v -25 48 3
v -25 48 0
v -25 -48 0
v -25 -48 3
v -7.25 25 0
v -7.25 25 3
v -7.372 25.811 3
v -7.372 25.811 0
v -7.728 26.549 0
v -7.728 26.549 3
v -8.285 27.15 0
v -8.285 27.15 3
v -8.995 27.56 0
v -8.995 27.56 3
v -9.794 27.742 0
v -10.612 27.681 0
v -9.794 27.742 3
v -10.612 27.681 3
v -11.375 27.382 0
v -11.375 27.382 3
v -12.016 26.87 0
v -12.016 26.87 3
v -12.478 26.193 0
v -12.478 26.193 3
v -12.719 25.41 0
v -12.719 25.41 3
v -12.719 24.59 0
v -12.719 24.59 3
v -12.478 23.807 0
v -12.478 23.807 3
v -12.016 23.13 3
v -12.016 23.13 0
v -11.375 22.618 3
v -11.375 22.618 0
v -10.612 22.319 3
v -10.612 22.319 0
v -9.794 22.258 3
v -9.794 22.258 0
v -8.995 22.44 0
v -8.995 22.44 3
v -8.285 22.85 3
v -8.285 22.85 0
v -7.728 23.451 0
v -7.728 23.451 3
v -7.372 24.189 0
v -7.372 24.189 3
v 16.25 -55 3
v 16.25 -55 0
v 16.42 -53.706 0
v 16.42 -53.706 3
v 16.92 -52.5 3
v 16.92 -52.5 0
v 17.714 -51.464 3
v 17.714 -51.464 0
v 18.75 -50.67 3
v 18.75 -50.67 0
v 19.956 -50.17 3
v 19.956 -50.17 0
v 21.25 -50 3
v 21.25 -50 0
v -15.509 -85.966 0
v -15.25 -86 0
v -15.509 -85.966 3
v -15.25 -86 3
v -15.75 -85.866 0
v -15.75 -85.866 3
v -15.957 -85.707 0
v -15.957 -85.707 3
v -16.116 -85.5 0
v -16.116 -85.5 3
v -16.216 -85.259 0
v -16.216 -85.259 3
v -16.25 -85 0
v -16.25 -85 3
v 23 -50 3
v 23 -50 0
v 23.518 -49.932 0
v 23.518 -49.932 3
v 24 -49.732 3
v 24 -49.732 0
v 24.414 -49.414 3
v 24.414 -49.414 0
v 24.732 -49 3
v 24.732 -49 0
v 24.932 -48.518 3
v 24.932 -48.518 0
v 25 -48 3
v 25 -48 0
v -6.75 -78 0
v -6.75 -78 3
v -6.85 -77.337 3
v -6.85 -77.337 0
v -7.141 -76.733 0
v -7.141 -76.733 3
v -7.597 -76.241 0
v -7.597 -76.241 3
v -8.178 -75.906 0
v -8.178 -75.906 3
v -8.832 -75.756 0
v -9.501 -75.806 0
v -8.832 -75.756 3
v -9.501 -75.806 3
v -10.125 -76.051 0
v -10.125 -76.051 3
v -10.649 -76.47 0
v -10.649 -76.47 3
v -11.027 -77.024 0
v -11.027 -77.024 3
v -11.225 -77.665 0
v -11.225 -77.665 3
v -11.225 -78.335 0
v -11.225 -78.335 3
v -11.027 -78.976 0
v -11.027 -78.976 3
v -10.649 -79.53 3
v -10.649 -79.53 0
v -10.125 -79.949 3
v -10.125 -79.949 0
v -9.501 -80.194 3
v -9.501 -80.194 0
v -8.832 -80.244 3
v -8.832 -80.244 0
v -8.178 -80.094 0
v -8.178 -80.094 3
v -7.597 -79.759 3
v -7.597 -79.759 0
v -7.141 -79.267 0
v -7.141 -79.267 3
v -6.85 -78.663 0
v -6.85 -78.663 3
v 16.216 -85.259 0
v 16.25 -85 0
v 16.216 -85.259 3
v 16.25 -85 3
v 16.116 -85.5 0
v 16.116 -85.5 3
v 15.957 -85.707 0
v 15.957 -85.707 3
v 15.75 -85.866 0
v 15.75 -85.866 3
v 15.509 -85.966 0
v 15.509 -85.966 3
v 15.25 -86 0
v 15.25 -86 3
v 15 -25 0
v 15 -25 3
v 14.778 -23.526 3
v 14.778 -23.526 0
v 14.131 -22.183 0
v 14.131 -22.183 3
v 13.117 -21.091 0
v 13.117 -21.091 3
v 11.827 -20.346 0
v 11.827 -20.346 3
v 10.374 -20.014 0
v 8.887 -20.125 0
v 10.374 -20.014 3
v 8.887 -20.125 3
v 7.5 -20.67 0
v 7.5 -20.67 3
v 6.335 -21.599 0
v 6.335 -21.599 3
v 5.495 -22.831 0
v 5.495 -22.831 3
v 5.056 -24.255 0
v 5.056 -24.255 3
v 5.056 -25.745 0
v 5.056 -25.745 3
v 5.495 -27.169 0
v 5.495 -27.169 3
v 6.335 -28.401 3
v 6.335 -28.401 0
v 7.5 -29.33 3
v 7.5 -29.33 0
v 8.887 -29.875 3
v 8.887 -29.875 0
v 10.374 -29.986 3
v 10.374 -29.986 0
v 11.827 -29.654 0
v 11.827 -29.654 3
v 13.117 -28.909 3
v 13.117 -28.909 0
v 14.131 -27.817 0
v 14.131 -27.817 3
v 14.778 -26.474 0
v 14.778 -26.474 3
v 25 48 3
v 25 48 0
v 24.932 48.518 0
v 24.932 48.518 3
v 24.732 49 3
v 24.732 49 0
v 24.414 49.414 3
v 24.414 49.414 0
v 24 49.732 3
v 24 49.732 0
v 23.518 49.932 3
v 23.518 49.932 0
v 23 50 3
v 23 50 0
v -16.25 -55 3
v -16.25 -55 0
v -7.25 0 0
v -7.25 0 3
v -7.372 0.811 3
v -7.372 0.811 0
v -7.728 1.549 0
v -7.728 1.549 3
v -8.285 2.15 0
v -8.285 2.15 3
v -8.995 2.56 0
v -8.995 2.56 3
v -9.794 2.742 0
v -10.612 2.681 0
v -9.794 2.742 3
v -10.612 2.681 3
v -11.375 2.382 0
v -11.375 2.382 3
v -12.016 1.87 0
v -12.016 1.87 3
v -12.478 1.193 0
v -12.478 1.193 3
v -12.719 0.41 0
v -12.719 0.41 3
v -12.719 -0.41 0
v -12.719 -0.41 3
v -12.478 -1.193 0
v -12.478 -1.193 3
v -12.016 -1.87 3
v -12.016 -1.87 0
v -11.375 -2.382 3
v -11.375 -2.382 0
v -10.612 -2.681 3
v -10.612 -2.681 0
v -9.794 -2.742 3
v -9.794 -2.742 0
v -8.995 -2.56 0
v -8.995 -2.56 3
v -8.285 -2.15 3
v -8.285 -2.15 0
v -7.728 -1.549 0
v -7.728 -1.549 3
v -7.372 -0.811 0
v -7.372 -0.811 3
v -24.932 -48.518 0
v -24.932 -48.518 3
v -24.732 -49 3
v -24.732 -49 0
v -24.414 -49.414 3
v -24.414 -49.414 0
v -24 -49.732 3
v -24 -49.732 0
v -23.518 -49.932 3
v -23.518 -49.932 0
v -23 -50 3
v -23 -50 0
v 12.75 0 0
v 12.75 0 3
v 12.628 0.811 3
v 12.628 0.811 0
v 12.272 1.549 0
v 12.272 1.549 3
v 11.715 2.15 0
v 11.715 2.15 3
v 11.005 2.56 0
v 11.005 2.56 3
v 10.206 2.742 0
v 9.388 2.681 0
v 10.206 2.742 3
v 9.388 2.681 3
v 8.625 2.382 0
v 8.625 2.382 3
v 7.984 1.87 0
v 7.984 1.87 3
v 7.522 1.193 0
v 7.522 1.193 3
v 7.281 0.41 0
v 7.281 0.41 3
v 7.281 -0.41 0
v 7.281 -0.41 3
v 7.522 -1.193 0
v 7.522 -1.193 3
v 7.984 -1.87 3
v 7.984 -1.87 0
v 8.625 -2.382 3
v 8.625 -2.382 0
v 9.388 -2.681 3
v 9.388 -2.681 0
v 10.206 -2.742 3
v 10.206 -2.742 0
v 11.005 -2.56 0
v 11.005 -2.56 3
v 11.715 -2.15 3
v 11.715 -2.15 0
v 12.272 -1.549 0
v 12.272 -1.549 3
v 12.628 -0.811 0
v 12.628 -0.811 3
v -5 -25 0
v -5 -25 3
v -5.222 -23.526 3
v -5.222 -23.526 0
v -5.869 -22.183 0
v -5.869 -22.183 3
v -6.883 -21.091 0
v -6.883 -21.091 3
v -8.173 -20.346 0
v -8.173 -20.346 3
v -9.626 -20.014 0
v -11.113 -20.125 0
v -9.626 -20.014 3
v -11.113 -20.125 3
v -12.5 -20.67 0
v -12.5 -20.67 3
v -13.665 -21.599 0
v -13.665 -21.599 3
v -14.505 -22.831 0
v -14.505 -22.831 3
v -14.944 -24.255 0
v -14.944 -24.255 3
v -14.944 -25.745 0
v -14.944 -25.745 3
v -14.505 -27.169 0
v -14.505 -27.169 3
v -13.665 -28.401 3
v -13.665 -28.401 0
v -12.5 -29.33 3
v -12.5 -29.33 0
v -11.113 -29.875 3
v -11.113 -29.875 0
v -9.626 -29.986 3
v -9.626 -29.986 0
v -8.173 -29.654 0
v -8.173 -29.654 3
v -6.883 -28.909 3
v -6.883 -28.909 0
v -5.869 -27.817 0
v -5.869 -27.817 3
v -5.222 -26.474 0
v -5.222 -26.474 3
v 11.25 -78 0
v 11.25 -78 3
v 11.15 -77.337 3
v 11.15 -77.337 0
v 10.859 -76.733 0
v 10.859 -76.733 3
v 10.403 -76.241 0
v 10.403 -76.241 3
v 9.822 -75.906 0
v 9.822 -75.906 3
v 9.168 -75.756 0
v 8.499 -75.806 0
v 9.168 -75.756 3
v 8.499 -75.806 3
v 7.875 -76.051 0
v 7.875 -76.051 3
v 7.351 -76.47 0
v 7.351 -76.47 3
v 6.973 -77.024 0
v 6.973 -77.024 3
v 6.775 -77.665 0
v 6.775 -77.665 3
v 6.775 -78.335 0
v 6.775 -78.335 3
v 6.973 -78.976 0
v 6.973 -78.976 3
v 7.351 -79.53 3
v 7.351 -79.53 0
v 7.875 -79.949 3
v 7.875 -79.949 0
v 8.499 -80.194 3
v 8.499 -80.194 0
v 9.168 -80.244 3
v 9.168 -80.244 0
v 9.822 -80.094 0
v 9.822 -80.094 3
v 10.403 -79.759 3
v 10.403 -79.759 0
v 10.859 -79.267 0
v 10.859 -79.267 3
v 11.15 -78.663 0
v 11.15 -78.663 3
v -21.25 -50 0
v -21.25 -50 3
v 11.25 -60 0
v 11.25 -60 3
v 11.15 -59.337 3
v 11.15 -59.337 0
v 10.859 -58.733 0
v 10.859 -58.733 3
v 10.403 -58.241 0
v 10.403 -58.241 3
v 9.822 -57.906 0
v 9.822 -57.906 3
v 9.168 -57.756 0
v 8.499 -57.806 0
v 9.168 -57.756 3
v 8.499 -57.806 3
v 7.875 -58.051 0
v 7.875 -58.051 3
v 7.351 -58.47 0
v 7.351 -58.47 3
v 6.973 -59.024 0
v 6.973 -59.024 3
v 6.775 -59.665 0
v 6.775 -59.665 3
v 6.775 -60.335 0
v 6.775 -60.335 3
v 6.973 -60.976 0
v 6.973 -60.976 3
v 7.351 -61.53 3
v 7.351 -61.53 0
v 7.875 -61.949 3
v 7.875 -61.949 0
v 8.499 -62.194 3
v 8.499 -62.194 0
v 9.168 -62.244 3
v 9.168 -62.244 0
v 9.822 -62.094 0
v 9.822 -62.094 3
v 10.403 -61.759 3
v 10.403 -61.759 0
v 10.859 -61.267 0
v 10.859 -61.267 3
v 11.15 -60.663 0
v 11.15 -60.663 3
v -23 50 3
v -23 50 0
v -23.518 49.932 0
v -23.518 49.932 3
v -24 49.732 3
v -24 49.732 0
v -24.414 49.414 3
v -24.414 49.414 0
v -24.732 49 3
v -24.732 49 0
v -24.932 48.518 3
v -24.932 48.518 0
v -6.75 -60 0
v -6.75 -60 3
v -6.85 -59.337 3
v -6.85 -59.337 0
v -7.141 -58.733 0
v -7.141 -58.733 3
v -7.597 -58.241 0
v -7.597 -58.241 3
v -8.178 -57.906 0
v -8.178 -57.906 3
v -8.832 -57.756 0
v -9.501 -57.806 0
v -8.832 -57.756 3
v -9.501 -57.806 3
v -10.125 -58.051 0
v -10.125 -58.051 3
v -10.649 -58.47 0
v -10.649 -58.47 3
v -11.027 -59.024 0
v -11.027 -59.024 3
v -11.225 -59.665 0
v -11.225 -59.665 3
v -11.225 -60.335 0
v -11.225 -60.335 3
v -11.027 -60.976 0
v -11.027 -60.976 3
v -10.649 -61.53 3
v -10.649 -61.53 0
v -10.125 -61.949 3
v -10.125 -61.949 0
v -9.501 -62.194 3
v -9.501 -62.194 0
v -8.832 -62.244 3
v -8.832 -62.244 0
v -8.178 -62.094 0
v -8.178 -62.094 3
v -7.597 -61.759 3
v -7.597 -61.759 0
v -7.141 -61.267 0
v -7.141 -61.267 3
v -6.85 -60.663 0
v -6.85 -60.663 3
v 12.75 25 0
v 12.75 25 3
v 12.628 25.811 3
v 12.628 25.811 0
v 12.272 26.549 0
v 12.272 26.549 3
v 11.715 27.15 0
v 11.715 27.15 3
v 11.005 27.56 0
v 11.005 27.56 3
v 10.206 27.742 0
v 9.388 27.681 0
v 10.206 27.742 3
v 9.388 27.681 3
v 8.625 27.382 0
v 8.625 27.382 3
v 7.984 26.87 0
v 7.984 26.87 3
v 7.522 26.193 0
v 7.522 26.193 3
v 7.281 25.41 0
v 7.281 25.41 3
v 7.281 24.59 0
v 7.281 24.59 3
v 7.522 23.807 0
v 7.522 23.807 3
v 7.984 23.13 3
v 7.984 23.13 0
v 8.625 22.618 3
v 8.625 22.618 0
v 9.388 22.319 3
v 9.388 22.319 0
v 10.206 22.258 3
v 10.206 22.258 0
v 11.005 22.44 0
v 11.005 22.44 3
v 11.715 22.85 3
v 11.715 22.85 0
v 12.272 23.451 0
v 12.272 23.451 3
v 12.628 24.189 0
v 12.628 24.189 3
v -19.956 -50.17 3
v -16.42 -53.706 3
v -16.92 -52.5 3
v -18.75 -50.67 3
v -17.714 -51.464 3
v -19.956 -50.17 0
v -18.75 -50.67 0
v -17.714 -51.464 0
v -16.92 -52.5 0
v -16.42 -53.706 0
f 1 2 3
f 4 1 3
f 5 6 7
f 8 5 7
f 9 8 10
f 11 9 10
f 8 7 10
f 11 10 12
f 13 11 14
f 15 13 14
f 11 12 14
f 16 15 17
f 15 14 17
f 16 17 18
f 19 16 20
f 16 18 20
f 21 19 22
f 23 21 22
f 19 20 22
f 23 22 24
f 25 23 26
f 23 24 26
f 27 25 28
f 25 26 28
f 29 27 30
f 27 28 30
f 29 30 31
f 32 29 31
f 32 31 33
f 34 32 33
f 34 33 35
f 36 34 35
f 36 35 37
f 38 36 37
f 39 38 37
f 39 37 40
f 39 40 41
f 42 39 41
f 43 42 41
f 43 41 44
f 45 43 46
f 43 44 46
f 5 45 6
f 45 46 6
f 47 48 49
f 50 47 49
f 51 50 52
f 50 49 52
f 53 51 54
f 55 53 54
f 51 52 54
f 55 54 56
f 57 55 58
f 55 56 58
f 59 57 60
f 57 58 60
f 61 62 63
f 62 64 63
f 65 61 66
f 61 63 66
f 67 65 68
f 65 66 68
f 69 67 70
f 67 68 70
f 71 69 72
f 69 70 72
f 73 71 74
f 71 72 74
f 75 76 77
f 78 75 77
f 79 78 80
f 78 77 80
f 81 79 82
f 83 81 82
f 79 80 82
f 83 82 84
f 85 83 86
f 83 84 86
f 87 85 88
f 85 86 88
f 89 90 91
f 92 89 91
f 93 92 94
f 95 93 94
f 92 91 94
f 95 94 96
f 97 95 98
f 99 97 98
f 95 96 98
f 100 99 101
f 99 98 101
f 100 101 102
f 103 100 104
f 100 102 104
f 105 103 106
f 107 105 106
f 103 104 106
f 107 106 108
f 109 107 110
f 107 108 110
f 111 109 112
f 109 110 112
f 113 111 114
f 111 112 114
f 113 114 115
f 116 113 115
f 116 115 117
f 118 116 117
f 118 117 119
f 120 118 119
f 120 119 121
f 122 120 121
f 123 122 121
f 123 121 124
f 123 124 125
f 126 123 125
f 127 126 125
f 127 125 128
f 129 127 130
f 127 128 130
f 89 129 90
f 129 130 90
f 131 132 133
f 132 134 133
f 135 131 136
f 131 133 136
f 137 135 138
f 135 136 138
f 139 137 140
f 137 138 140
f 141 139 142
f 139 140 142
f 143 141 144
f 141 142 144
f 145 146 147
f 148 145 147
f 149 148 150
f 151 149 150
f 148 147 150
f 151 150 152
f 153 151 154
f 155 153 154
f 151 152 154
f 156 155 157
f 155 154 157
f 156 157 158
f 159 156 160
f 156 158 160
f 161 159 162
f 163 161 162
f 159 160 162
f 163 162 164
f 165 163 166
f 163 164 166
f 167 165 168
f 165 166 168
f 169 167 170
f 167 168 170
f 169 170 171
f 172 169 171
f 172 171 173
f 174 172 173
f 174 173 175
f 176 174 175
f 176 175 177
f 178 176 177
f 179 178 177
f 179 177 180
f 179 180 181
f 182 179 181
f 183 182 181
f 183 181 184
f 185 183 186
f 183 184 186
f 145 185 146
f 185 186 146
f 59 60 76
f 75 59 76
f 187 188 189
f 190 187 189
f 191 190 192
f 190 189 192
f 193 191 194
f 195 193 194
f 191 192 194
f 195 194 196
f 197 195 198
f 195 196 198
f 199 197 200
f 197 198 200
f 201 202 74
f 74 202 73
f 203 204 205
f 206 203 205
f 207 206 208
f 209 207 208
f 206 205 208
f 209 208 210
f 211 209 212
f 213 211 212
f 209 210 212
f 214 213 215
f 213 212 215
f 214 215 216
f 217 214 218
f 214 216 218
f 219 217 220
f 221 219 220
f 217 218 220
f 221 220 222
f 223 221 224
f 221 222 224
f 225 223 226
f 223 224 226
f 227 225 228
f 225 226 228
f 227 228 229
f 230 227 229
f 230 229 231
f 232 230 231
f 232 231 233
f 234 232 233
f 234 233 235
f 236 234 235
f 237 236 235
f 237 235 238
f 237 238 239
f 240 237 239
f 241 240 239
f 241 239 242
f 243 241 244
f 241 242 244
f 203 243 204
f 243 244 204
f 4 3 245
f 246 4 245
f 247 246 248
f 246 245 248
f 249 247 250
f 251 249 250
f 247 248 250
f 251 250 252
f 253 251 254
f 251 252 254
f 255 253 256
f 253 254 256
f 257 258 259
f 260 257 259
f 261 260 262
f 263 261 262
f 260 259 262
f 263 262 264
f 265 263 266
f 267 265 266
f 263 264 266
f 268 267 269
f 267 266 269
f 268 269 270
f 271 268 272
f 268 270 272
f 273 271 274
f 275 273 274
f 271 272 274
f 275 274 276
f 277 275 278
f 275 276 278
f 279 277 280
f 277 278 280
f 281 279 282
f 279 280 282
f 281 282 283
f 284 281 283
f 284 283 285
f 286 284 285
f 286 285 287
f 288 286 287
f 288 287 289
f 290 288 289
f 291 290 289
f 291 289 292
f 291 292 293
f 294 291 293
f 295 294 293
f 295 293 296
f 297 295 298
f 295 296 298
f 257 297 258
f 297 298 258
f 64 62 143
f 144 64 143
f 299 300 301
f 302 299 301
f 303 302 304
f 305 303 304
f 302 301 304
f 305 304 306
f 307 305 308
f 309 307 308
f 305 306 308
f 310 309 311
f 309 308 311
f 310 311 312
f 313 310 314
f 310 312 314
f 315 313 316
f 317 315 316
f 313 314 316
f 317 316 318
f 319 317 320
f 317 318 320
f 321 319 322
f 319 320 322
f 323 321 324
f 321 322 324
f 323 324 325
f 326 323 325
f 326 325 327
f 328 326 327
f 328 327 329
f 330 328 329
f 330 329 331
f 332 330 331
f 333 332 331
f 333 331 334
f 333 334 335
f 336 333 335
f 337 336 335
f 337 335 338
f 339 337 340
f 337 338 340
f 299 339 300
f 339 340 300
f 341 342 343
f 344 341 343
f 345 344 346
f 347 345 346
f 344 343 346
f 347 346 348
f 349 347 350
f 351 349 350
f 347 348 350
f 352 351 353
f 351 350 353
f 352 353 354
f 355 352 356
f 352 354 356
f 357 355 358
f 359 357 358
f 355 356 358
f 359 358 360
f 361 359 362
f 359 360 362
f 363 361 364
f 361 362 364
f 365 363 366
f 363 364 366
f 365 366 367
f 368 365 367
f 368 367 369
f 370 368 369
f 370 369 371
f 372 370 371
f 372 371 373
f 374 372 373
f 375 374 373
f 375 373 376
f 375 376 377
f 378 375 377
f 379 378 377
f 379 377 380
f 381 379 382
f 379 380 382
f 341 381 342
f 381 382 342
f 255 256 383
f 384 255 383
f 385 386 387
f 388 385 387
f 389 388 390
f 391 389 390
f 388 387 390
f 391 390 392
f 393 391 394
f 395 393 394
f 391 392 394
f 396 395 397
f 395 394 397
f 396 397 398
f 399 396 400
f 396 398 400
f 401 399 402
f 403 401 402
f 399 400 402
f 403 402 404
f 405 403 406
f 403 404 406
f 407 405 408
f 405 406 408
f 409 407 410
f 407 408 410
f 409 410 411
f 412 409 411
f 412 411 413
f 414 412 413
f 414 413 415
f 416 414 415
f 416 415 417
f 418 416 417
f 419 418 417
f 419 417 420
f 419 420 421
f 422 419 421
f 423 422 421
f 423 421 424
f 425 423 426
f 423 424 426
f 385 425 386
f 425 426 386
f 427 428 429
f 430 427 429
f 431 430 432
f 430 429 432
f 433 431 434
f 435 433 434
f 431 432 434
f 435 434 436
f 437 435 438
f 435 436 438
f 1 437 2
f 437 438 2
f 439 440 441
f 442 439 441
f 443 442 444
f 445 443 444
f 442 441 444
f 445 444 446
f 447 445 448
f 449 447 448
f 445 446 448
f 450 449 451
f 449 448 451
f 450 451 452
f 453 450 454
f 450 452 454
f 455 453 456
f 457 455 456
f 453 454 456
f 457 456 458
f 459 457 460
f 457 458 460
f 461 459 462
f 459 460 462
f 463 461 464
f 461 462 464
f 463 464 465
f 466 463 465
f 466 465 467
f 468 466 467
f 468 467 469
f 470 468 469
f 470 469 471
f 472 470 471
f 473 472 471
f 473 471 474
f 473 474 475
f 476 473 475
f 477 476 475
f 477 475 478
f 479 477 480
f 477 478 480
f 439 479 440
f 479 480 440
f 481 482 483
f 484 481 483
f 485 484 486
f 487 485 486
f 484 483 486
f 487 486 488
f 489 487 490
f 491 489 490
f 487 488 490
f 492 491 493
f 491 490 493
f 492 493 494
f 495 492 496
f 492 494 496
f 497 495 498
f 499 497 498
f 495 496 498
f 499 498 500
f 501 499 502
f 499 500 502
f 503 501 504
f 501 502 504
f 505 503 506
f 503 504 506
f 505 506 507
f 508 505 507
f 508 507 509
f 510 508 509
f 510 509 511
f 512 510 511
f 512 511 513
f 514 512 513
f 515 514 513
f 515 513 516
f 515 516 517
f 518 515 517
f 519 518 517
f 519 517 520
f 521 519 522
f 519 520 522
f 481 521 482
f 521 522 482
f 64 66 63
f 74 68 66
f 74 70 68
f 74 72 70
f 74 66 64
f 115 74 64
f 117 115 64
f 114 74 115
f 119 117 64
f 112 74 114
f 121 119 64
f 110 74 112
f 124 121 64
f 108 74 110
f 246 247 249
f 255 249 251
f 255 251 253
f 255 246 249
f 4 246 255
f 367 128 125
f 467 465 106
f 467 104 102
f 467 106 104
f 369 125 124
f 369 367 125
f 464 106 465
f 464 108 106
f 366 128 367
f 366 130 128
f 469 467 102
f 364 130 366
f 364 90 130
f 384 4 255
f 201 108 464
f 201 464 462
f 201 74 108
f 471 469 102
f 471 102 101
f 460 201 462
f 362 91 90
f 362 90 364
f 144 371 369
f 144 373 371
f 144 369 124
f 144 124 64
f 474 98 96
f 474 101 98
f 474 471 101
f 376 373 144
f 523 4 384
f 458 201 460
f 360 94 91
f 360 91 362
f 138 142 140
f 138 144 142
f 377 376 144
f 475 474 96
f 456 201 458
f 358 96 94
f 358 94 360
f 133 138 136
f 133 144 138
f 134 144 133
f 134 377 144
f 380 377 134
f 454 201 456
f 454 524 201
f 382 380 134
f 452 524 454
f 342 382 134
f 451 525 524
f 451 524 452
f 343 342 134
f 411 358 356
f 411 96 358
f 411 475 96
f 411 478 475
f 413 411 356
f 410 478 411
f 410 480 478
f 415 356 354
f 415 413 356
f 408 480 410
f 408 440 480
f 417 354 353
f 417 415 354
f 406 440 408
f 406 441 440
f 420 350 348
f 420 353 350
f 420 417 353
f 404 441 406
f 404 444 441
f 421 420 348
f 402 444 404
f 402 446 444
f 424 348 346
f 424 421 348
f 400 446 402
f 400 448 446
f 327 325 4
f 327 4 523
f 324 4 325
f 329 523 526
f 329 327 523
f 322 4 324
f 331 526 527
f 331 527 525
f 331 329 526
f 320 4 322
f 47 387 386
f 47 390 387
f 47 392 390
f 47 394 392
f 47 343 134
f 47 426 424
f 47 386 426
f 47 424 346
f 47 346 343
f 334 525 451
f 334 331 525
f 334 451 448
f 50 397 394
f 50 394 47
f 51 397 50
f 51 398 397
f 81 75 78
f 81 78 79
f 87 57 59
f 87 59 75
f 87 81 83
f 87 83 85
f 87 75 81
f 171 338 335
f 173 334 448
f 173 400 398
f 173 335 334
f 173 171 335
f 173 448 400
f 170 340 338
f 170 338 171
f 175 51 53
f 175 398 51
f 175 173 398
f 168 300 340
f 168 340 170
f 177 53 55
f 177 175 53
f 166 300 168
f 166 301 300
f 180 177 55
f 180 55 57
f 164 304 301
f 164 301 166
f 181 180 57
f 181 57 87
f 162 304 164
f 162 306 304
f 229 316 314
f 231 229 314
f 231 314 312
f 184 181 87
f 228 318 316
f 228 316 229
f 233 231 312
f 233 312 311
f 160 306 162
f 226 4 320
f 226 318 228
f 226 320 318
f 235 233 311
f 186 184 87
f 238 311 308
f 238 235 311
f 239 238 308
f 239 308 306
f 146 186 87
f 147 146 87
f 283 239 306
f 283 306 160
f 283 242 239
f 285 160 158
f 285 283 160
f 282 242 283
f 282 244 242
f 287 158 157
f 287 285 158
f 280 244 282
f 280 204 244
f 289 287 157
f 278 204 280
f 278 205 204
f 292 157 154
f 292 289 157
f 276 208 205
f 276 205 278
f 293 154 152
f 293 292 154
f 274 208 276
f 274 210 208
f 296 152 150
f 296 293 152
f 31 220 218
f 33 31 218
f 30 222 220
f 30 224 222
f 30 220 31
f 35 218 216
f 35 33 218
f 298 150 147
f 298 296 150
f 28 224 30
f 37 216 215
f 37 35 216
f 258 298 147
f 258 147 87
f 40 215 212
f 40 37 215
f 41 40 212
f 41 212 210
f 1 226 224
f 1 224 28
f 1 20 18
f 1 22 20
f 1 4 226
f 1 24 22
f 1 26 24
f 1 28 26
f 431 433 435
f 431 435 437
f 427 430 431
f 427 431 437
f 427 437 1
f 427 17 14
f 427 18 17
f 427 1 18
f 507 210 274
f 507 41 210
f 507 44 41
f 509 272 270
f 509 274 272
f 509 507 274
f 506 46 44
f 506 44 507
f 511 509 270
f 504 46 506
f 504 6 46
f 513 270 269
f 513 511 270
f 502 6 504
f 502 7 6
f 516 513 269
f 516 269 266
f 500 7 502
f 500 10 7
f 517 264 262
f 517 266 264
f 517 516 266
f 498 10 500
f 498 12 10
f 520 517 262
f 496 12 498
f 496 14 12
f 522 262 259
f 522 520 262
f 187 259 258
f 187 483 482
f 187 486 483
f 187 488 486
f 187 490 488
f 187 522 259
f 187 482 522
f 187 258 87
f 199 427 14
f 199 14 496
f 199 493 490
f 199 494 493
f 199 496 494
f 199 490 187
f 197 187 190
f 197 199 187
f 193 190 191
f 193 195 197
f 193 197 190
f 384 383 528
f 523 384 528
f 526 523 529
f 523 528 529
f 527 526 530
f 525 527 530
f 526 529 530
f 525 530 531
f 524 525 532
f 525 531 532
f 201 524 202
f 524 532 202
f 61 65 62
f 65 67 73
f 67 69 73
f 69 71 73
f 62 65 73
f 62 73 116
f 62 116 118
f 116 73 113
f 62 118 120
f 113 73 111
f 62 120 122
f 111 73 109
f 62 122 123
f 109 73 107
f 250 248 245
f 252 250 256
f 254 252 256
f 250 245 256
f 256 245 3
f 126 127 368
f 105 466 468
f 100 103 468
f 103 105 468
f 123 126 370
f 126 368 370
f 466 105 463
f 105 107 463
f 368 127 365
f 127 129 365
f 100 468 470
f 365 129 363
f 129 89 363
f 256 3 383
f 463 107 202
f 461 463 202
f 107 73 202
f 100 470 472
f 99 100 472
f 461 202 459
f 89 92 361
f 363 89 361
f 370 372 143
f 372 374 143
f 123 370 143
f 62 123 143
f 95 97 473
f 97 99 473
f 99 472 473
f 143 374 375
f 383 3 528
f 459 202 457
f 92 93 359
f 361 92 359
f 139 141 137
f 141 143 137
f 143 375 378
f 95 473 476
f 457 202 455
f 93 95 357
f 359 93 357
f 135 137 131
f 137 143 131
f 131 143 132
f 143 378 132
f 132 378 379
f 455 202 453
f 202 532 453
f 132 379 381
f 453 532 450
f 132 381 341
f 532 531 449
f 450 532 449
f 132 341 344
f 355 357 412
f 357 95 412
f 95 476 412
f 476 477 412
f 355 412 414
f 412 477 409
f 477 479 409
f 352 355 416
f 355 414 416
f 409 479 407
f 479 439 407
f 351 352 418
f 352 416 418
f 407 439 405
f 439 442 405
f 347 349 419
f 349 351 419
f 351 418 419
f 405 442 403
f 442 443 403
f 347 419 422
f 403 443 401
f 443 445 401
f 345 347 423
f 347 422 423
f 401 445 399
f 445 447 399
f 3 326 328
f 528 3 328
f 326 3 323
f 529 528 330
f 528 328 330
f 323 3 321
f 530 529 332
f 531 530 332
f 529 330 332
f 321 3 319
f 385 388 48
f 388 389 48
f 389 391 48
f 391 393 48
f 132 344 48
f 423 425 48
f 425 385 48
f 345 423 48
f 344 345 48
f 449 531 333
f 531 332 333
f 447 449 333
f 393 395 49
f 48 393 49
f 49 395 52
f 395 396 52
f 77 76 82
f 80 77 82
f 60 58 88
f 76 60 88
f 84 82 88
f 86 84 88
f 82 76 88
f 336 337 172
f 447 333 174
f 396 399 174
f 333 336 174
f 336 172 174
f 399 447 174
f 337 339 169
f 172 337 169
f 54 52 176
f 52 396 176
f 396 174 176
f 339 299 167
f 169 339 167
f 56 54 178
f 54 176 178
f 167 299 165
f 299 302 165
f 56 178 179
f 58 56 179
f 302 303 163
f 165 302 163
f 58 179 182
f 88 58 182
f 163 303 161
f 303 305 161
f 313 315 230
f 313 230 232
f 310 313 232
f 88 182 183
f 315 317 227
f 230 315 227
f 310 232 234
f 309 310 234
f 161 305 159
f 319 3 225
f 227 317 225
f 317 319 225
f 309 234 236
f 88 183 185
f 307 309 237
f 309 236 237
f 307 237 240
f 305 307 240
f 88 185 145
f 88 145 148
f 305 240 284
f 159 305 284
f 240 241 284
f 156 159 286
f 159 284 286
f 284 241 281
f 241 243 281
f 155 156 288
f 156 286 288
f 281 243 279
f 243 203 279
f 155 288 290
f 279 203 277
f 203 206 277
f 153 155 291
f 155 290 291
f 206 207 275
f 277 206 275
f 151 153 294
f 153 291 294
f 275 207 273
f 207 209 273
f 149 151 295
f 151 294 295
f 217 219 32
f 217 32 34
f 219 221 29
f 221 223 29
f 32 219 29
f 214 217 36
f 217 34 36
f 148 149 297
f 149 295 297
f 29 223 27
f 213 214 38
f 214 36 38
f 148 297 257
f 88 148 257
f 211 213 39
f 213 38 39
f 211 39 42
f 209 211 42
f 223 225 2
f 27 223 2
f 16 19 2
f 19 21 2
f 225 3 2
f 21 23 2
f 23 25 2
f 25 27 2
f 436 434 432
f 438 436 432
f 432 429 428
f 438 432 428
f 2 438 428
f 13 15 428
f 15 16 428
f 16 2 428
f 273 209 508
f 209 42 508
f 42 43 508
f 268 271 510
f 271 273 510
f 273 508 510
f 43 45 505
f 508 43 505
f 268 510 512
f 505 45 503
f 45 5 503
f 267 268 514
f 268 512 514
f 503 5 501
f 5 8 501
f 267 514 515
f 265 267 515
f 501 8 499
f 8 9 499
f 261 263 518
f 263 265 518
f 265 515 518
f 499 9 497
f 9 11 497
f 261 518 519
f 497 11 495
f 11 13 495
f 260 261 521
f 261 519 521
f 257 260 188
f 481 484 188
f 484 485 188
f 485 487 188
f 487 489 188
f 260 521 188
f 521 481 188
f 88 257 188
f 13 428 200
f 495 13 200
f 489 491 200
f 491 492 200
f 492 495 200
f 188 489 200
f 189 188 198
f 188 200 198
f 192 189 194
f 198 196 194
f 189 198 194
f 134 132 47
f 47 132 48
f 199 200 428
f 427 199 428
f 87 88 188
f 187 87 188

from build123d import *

# Parameters (mm, degrees)
F1_DEPTH = 3
F2_R     = 5
F2_R_2   = 2.75
F3_DEPTH = 3
F4_R     = 2.25
F5_DEPTH = 3
F6_R     = 1


with BuildPart() as f1:
    # F0 (on Top) → F1 (new body)
    with BuildSketch(Plane.XY):
        with BuildLine():
            ThreePointArc((25, 48), (24.414214, 49.414214), (23, 50))
            Line((23, 50), (-23, 50))
            ThreePointArc((-23, 50), (-24.414214, 49.414214), (-25, 48))
            Line((-25, 48), (-25, -48))
            ThreePointArc((-25, -48), (-24.414214, -49.414214), (-23, -50))
            Line((-23, -50), (-21.25, -50))
            ThreePointArc((-21.25, -50), (-17.714466, -51.464466), (-16.25, -55))
            Line((-16.25, -55), (-16.25, -86))
            Line((-16.25, -86), (0, -86))
            Line((0, -86), (16.25, -86))
            Line((16.25, -86), (16.25, -55))
            ThreePointArc((16.25, -55), (17.714466, -51.464466), (21.25, -50))
            Line((21.25, -50), (23, -50))
            ThreePointArc((23, -50), (24.414214, -49.414214), (25, -48))
            Line((25, -48), (25, 48))
        make_face()
    extrude(amount=F1_DEPTH)

    # F2 (on face) → F3 (cut, through all)
    with BuildSketch(Plane.XY.offset(3)):
        with Locations((-10, -25)):
            Circle(F2_R)
        with Locations((-10, 0)):
            Circle(F2_R_2)
        with Locations((-10, 25)):
            Circle(F2_R_2)
        with Locations((10, 25)):
            Circle(F2_R_2)
        with Locations((10, 0)):
            Circle(F2_R_2)
        with Locations((10, -25)):
            Circle(F2_R)
    extrude(amount=-F3_DEPTH, mode=Mode.SUBTRACT)

    # F4 (on face) → F5 (cut, through all)
    with BuildSketch(Plane.XY.offset(3)):
        with Locations((-9, -60)):
            Circle(F4_R)
        with Locations((9, -60)):
            Circle(F4_R)
        with Locations((9, -78)):
            Circle(F4_R)
        with Locations((-9, -78)):
            Circle(F4_R)
    extrude(amount=-F5_DEPTH, mode=Mode.SUBTRACT)

    # F6
    f6_edges = [f1.edges().sort_by_distance(p)[0] for p in [
        (-16.25, -86, 1.5),
        (16.25, -86, 1.5),
    ]]
    fillet(f6_edges, radius=F6_R)


solid = f1.part
